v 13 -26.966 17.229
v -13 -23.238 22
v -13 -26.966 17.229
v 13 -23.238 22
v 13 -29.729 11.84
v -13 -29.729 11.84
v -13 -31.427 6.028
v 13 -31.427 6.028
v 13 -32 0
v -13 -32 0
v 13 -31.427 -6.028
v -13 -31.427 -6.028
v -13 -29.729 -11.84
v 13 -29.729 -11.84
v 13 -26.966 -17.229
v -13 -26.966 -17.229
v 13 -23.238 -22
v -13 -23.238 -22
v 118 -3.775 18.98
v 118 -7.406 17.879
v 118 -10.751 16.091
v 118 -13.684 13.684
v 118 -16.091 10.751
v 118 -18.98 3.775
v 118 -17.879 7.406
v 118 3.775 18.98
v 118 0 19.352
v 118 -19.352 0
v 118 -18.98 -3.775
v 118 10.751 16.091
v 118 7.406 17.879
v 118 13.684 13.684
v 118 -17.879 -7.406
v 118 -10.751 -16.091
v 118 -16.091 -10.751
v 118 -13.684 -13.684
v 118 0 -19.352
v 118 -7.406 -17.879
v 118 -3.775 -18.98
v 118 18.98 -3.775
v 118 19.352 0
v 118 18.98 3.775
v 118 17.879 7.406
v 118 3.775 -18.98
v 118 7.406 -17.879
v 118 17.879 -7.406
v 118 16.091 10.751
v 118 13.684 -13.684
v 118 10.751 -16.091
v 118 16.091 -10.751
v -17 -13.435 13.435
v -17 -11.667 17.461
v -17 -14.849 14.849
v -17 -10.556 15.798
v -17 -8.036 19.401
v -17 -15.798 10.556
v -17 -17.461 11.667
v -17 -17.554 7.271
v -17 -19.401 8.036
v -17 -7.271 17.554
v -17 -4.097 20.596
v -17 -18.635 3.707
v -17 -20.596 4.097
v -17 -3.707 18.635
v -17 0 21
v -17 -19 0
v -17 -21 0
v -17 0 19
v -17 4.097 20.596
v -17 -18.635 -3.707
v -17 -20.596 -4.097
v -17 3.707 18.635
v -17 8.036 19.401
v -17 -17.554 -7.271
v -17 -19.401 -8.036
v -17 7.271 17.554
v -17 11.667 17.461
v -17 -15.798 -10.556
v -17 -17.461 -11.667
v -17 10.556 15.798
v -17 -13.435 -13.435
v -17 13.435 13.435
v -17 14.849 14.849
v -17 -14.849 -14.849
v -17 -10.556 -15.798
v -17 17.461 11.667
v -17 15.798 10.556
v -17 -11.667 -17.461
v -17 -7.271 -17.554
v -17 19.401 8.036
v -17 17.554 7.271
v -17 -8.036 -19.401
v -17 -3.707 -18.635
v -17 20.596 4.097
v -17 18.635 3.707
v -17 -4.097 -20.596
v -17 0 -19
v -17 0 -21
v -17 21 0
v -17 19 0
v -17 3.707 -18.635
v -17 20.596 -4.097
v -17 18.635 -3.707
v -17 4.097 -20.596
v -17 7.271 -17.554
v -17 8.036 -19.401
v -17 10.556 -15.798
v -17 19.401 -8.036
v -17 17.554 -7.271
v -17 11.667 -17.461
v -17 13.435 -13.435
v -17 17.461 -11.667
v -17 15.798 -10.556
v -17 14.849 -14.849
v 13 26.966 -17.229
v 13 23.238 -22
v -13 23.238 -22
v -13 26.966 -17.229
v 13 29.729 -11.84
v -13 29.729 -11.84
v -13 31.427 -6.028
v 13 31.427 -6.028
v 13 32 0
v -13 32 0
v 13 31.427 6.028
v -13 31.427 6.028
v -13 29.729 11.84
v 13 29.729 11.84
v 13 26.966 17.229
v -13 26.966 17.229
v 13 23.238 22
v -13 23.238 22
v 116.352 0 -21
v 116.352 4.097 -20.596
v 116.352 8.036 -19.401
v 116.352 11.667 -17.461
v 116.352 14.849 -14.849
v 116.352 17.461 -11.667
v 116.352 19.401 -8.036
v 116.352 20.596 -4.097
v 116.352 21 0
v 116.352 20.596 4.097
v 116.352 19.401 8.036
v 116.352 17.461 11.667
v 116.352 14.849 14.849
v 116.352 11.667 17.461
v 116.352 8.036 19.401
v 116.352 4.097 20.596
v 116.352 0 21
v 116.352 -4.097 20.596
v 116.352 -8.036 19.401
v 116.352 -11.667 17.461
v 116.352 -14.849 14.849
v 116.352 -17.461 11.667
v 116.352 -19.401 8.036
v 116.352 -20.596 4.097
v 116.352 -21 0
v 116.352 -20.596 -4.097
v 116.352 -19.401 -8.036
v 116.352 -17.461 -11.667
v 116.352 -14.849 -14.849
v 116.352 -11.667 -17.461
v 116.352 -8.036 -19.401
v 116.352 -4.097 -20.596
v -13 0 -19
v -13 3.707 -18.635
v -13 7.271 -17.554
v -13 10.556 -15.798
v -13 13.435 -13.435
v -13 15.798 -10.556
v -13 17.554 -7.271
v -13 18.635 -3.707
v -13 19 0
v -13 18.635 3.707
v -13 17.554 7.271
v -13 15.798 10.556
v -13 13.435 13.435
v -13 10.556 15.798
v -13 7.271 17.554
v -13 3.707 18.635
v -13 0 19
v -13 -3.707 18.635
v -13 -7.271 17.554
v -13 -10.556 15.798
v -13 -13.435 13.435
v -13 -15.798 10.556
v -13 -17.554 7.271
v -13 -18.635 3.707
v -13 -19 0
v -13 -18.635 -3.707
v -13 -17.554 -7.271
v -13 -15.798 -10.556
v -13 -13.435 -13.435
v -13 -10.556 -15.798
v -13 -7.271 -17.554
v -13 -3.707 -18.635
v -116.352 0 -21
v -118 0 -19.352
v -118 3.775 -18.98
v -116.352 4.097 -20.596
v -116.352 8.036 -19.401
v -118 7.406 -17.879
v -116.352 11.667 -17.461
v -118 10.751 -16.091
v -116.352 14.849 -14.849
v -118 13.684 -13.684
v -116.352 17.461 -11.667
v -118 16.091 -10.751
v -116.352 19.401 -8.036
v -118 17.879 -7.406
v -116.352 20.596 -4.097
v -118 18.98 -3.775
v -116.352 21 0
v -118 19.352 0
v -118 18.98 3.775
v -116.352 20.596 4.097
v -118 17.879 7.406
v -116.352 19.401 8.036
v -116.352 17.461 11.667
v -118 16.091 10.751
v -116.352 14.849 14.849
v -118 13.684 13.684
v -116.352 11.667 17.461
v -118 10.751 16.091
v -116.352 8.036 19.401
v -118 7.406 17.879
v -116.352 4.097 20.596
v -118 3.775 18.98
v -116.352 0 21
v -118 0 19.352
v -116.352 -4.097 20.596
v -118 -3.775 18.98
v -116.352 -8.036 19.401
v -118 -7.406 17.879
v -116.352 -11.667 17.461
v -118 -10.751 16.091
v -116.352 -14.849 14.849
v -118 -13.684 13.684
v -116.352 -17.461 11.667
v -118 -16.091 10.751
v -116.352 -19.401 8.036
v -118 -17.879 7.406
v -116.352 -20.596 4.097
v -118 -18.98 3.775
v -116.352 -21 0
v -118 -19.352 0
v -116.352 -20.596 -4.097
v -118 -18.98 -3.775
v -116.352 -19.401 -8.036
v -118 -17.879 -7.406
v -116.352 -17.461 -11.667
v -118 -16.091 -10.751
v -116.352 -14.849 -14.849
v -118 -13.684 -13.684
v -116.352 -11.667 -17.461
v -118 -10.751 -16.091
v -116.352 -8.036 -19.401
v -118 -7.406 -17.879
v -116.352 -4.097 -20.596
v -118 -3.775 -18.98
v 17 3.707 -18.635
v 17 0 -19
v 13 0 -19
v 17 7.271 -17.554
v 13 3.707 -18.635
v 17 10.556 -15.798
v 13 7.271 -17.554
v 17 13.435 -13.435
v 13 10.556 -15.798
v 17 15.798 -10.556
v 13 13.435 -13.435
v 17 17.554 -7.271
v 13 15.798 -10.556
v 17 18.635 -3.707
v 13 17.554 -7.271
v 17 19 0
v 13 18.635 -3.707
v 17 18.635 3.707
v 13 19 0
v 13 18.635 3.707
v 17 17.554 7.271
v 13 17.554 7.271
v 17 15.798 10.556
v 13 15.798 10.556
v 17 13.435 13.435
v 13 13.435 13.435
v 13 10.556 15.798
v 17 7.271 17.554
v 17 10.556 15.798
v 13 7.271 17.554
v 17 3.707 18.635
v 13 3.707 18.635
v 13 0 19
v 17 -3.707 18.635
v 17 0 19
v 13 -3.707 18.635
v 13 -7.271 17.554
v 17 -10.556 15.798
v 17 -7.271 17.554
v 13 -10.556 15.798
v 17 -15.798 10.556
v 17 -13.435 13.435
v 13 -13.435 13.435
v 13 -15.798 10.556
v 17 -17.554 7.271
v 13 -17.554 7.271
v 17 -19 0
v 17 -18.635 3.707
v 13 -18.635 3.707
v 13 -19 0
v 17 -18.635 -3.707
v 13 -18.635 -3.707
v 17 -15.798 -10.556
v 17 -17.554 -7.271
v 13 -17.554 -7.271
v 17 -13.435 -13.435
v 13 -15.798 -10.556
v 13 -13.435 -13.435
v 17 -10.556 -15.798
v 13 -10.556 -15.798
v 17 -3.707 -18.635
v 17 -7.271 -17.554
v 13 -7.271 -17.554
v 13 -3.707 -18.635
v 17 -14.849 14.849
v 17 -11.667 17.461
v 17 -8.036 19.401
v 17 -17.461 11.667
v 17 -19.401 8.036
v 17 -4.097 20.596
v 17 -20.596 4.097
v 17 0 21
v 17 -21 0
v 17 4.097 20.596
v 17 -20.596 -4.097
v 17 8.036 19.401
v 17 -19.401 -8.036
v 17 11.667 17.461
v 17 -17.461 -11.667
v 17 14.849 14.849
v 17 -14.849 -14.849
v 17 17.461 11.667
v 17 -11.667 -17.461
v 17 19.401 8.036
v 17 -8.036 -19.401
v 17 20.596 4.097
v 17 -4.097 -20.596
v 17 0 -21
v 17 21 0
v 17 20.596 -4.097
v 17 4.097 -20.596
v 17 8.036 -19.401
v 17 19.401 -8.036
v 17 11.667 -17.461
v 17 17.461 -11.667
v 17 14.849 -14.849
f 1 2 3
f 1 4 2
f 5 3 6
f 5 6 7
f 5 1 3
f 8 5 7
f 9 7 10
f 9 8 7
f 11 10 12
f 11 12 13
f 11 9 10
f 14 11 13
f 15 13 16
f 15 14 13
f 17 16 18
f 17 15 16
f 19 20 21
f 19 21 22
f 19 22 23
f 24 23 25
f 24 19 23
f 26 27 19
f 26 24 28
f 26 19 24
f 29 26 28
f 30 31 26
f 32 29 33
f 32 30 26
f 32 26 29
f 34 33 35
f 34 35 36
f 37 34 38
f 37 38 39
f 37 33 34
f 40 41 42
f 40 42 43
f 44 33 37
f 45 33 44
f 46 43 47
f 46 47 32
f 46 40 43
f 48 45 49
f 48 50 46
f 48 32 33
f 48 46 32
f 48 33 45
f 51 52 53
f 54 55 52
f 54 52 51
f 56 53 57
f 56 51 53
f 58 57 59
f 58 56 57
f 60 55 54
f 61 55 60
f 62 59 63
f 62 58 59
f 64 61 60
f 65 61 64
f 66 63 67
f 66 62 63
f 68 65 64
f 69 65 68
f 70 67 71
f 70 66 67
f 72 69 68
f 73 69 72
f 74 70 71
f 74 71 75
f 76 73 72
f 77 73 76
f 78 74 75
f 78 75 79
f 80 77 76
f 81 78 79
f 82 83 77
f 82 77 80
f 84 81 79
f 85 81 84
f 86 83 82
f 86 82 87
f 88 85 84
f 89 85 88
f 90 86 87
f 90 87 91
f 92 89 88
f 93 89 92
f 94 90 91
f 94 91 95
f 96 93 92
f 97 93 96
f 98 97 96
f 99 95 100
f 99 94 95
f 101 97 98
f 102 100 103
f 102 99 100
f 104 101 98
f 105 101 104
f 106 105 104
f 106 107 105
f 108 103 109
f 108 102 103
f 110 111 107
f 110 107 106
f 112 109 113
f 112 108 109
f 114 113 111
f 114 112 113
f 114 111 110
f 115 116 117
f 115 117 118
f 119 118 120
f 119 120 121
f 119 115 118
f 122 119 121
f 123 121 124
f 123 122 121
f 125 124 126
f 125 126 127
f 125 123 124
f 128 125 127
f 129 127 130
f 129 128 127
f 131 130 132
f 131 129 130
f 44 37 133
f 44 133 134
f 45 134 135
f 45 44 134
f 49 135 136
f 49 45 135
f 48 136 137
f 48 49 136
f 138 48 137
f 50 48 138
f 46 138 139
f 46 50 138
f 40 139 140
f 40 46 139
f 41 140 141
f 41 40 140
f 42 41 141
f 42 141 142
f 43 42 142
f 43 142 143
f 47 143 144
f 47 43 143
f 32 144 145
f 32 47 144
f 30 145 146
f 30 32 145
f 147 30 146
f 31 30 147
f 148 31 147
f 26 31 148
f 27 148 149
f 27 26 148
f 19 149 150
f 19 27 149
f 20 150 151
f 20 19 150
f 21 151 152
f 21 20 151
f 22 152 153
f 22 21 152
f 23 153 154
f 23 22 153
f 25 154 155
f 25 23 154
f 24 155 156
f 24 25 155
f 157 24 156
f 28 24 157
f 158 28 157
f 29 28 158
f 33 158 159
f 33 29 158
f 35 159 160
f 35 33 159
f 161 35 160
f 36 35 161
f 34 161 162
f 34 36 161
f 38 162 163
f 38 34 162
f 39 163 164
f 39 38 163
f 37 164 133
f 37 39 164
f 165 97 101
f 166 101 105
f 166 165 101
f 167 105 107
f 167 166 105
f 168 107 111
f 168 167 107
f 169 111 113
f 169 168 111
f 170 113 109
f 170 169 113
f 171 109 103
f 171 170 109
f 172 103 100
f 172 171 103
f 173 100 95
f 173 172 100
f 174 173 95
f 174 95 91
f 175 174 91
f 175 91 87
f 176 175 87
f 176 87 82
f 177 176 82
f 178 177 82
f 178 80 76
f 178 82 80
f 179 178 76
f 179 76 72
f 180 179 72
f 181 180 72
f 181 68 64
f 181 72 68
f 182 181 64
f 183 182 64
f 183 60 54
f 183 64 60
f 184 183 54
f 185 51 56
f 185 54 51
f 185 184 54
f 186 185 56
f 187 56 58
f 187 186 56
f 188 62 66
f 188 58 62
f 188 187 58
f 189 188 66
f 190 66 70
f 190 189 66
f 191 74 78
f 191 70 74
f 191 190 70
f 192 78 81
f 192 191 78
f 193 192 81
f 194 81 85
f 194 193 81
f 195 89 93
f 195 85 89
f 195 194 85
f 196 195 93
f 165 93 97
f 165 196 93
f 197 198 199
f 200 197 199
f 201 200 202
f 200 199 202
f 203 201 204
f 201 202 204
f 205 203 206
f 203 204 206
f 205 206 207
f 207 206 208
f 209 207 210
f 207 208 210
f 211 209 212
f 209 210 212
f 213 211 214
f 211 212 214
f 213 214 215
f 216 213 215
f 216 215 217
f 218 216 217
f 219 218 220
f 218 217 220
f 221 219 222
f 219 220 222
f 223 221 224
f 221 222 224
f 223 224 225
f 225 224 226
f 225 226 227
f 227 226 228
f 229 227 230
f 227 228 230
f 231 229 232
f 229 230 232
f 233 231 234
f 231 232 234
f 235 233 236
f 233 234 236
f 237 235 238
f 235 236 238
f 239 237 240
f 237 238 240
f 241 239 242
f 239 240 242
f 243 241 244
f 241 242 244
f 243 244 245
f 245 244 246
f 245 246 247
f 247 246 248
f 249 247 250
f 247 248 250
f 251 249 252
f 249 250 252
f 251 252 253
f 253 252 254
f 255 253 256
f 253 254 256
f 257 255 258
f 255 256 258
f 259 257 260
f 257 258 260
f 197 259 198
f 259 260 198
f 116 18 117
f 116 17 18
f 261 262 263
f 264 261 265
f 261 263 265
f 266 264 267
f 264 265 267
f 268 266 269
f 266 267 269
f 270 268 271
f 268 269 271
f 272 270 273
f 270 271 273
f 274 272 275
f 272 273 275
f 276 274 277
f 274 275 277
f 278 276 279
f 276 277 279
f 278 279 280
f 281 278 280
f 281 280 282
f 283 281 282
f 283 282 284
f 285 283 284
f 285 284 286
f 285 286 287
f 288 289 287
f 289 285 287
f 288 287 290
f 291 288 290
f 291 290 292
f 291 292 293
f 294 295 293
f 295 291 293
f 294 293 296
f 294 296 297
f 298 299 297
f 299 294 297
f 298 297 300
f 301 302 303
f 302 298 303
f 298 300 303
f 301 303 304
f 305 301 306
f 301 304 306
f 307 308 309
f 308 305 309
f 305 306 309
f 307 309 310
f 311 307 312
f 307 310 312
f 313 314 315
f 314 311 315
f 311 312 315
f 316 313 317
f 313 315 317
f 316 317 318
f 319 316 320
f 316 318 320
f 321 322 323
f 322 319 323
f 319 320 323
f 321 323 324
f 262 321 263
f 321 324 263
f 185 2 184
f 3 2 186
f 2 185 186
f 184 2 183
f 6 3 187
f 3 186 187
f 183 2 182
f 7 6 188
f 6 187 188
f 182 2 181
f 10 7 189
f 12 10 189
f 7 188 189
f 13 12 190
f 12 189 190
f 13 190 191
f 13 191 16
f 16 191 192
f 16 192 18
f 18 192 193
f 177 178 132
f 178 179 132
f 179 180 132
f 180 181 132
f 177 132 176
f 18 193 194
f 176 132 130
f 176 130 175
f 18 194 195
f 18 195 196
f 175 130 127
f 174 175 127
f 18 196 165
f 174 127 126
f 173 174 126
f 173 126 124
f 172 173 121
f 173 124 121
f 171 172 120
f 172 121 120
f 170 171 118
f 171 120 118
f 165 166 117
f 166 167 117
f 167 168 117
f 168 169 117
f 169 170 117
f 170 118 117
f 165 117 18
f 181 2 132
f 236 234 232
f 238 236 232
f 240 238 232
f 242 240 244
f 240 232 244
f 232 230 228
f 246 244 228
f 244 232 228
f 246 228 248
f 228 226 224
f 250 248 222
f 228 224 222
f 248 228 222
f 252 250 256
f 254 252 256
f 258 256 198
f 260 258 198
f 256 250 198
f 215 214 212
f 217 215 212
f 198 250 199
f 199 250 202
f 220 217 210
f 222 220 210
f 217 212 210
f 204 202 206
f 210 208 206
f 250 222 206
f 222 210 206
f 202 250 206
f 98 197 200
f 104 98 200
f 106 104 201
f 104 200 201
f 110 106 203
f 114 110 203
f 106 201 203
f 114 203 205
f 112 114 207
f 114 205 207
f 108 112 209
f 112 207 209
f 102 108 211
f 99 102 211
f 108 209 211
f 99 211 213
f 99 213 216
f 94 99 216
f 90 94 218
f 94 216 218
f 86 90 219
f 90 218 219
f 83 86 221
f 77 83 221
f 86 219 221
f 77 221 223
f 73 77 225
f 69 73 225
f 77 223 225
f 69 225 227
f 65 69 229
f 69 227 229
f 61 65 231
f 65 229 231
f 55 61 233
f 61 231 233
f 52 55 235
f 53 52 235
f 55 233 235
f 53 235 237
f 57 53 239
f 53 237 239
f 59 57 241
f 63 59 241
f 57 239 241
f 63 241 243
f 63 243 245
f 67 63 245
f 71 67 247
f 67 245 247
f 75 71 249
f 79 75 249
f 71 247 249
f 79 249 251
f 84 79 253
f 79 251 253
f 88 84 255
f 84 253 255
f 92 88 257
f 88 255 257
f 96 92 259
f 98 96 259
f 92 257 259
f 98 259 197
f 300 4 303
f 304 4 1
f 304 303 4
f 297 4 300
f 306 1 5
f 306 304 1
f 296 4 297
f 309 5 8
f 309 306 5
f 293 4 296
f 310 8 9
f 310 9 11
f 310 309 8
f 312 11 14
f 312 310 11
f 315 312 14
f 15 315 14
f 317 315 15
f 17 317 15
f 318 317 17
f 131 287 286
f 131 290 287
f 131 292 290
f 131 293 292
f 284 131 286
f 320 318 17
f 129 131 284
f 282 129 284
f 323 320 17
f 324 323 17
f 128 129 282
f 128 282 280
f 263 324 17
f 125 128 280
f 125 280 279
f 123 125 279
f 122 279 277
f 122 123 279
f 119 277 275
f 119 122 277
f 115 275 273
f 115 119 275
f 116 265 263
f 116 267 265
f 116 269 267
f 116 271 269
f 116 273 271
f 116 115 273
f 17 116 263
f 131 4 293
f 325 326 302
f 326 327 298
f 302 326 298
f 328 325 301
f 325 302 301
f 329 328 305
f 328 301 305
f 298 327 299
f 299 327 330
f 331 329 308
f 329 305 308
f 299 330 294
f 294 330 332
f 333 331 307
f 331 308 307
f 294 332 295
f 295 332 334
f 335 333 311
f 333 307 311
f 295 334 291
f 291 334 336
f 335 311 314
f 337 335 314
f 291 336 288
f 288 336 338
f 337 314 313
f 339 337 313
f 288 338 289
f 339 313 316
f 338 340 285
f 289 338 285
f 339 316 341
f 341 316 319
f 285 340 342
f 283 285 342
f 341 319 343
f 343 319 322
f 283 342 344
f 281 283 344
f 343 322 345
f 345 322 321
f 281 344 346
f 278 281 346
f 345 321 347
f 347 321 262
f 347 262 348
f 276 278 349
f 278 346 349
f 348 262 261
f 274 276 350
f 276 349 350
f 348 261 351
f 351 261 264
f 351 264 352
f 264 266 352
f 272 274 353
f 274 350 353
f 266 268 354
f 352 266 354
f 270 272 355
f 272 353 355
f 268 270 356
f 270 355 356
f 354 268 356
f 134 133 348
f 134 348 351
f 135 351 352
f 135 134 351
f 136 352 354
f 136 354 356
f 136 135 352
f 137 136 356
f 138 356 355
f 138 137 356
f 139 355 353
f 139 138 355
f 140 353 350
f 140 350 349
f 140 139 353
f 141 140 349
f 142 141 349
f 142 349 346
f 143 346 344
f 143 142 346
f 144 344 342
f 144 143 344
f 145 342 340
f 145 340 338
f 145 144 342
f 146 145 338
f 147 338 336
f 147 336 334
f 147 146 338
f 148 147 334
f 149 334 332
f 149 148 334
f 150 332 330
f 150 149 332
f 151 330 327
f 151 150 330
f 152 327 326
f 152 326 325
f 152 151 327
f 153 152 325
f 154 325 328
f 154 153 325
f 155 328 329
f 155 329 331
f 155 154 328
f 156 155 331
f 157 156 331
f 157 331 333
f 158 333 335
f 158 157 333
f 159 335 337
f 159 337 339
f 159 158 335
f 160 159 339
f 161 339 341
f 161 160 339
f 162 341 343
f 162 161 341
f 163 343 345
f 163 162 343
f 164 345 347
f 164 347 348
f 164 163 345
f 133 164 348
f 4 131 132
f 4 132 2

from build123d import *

# Parameters (mm, degrees)
EXTRUDE_1_DEPTH = 13
SKETCH_2_R      = 19
EXTRUDE_2_DEPTH = 105
SKETCH_3_R      = 21
EXTRUDE_3_DEPTH = 101
CHAMFER_1_SIZE  = 1.648


with BuildPart() as part:
    # Эскиз1 → Бобышка-Вытянуть1 (new body)
    with BuildSketch(Plane(origin=(0, 0, 0), x_dir=(0, 0, -1), z_dir=(1, 0, 0))):
        with BuildLine():
            Line((22, -23.237900077), (22, 23.237900077))
            ThreePointArc((22, 23.237900077), (0, 32), (-22, 23.237900077))
            Line((-22, 23.237900077), (-22, -23.237900077))
            ThreePointArc((-22, -23.237900077), (0, -32), (22, -23.237900077))
        make_face()
    extrude(amount=EXTRUDE_1_DEPTH)

    # Эскиз2 → Бобышка-Вытянуть2 (add)
    with BuildSketch(Plane(origin=(13, 0, 0), x_dir=(0, 0, -1), z_dir=(1, 0, 0))):
        Circle(SKETCH_2_R)
    extrude(amount=EXTRUDE_2_DEPTH)

    # Эскиз3 → Бобышка-Вытянуть3 (add)
    with BuildSketch(Plane(origin=(118, 0, 0), x_dir=(0, 0, -1), z_dir=(1, 0, 0))):
        Circle(SKETCH_3_R)
    extrude(amount=-EXTRUDE_3_DEPTH)

    # Фаска1
    chamfer_1_edges = [part.edges().sort_by_distance(p)[0] for p in [
        (118, 0, 21),
    ]]
    chamfer(chamfer_1_edges, length=CHAMFER_1_SIZE)

    # Зеркальное отражение4: part across plane


with BuildPart() as part_1:
    add(part.part)
    add(part.part.mirror(Plane(origin=(0, 0, 0), x_dir=(0, 0, 1), z_dir=(1, 0, 0))))


solid = part_1.part
